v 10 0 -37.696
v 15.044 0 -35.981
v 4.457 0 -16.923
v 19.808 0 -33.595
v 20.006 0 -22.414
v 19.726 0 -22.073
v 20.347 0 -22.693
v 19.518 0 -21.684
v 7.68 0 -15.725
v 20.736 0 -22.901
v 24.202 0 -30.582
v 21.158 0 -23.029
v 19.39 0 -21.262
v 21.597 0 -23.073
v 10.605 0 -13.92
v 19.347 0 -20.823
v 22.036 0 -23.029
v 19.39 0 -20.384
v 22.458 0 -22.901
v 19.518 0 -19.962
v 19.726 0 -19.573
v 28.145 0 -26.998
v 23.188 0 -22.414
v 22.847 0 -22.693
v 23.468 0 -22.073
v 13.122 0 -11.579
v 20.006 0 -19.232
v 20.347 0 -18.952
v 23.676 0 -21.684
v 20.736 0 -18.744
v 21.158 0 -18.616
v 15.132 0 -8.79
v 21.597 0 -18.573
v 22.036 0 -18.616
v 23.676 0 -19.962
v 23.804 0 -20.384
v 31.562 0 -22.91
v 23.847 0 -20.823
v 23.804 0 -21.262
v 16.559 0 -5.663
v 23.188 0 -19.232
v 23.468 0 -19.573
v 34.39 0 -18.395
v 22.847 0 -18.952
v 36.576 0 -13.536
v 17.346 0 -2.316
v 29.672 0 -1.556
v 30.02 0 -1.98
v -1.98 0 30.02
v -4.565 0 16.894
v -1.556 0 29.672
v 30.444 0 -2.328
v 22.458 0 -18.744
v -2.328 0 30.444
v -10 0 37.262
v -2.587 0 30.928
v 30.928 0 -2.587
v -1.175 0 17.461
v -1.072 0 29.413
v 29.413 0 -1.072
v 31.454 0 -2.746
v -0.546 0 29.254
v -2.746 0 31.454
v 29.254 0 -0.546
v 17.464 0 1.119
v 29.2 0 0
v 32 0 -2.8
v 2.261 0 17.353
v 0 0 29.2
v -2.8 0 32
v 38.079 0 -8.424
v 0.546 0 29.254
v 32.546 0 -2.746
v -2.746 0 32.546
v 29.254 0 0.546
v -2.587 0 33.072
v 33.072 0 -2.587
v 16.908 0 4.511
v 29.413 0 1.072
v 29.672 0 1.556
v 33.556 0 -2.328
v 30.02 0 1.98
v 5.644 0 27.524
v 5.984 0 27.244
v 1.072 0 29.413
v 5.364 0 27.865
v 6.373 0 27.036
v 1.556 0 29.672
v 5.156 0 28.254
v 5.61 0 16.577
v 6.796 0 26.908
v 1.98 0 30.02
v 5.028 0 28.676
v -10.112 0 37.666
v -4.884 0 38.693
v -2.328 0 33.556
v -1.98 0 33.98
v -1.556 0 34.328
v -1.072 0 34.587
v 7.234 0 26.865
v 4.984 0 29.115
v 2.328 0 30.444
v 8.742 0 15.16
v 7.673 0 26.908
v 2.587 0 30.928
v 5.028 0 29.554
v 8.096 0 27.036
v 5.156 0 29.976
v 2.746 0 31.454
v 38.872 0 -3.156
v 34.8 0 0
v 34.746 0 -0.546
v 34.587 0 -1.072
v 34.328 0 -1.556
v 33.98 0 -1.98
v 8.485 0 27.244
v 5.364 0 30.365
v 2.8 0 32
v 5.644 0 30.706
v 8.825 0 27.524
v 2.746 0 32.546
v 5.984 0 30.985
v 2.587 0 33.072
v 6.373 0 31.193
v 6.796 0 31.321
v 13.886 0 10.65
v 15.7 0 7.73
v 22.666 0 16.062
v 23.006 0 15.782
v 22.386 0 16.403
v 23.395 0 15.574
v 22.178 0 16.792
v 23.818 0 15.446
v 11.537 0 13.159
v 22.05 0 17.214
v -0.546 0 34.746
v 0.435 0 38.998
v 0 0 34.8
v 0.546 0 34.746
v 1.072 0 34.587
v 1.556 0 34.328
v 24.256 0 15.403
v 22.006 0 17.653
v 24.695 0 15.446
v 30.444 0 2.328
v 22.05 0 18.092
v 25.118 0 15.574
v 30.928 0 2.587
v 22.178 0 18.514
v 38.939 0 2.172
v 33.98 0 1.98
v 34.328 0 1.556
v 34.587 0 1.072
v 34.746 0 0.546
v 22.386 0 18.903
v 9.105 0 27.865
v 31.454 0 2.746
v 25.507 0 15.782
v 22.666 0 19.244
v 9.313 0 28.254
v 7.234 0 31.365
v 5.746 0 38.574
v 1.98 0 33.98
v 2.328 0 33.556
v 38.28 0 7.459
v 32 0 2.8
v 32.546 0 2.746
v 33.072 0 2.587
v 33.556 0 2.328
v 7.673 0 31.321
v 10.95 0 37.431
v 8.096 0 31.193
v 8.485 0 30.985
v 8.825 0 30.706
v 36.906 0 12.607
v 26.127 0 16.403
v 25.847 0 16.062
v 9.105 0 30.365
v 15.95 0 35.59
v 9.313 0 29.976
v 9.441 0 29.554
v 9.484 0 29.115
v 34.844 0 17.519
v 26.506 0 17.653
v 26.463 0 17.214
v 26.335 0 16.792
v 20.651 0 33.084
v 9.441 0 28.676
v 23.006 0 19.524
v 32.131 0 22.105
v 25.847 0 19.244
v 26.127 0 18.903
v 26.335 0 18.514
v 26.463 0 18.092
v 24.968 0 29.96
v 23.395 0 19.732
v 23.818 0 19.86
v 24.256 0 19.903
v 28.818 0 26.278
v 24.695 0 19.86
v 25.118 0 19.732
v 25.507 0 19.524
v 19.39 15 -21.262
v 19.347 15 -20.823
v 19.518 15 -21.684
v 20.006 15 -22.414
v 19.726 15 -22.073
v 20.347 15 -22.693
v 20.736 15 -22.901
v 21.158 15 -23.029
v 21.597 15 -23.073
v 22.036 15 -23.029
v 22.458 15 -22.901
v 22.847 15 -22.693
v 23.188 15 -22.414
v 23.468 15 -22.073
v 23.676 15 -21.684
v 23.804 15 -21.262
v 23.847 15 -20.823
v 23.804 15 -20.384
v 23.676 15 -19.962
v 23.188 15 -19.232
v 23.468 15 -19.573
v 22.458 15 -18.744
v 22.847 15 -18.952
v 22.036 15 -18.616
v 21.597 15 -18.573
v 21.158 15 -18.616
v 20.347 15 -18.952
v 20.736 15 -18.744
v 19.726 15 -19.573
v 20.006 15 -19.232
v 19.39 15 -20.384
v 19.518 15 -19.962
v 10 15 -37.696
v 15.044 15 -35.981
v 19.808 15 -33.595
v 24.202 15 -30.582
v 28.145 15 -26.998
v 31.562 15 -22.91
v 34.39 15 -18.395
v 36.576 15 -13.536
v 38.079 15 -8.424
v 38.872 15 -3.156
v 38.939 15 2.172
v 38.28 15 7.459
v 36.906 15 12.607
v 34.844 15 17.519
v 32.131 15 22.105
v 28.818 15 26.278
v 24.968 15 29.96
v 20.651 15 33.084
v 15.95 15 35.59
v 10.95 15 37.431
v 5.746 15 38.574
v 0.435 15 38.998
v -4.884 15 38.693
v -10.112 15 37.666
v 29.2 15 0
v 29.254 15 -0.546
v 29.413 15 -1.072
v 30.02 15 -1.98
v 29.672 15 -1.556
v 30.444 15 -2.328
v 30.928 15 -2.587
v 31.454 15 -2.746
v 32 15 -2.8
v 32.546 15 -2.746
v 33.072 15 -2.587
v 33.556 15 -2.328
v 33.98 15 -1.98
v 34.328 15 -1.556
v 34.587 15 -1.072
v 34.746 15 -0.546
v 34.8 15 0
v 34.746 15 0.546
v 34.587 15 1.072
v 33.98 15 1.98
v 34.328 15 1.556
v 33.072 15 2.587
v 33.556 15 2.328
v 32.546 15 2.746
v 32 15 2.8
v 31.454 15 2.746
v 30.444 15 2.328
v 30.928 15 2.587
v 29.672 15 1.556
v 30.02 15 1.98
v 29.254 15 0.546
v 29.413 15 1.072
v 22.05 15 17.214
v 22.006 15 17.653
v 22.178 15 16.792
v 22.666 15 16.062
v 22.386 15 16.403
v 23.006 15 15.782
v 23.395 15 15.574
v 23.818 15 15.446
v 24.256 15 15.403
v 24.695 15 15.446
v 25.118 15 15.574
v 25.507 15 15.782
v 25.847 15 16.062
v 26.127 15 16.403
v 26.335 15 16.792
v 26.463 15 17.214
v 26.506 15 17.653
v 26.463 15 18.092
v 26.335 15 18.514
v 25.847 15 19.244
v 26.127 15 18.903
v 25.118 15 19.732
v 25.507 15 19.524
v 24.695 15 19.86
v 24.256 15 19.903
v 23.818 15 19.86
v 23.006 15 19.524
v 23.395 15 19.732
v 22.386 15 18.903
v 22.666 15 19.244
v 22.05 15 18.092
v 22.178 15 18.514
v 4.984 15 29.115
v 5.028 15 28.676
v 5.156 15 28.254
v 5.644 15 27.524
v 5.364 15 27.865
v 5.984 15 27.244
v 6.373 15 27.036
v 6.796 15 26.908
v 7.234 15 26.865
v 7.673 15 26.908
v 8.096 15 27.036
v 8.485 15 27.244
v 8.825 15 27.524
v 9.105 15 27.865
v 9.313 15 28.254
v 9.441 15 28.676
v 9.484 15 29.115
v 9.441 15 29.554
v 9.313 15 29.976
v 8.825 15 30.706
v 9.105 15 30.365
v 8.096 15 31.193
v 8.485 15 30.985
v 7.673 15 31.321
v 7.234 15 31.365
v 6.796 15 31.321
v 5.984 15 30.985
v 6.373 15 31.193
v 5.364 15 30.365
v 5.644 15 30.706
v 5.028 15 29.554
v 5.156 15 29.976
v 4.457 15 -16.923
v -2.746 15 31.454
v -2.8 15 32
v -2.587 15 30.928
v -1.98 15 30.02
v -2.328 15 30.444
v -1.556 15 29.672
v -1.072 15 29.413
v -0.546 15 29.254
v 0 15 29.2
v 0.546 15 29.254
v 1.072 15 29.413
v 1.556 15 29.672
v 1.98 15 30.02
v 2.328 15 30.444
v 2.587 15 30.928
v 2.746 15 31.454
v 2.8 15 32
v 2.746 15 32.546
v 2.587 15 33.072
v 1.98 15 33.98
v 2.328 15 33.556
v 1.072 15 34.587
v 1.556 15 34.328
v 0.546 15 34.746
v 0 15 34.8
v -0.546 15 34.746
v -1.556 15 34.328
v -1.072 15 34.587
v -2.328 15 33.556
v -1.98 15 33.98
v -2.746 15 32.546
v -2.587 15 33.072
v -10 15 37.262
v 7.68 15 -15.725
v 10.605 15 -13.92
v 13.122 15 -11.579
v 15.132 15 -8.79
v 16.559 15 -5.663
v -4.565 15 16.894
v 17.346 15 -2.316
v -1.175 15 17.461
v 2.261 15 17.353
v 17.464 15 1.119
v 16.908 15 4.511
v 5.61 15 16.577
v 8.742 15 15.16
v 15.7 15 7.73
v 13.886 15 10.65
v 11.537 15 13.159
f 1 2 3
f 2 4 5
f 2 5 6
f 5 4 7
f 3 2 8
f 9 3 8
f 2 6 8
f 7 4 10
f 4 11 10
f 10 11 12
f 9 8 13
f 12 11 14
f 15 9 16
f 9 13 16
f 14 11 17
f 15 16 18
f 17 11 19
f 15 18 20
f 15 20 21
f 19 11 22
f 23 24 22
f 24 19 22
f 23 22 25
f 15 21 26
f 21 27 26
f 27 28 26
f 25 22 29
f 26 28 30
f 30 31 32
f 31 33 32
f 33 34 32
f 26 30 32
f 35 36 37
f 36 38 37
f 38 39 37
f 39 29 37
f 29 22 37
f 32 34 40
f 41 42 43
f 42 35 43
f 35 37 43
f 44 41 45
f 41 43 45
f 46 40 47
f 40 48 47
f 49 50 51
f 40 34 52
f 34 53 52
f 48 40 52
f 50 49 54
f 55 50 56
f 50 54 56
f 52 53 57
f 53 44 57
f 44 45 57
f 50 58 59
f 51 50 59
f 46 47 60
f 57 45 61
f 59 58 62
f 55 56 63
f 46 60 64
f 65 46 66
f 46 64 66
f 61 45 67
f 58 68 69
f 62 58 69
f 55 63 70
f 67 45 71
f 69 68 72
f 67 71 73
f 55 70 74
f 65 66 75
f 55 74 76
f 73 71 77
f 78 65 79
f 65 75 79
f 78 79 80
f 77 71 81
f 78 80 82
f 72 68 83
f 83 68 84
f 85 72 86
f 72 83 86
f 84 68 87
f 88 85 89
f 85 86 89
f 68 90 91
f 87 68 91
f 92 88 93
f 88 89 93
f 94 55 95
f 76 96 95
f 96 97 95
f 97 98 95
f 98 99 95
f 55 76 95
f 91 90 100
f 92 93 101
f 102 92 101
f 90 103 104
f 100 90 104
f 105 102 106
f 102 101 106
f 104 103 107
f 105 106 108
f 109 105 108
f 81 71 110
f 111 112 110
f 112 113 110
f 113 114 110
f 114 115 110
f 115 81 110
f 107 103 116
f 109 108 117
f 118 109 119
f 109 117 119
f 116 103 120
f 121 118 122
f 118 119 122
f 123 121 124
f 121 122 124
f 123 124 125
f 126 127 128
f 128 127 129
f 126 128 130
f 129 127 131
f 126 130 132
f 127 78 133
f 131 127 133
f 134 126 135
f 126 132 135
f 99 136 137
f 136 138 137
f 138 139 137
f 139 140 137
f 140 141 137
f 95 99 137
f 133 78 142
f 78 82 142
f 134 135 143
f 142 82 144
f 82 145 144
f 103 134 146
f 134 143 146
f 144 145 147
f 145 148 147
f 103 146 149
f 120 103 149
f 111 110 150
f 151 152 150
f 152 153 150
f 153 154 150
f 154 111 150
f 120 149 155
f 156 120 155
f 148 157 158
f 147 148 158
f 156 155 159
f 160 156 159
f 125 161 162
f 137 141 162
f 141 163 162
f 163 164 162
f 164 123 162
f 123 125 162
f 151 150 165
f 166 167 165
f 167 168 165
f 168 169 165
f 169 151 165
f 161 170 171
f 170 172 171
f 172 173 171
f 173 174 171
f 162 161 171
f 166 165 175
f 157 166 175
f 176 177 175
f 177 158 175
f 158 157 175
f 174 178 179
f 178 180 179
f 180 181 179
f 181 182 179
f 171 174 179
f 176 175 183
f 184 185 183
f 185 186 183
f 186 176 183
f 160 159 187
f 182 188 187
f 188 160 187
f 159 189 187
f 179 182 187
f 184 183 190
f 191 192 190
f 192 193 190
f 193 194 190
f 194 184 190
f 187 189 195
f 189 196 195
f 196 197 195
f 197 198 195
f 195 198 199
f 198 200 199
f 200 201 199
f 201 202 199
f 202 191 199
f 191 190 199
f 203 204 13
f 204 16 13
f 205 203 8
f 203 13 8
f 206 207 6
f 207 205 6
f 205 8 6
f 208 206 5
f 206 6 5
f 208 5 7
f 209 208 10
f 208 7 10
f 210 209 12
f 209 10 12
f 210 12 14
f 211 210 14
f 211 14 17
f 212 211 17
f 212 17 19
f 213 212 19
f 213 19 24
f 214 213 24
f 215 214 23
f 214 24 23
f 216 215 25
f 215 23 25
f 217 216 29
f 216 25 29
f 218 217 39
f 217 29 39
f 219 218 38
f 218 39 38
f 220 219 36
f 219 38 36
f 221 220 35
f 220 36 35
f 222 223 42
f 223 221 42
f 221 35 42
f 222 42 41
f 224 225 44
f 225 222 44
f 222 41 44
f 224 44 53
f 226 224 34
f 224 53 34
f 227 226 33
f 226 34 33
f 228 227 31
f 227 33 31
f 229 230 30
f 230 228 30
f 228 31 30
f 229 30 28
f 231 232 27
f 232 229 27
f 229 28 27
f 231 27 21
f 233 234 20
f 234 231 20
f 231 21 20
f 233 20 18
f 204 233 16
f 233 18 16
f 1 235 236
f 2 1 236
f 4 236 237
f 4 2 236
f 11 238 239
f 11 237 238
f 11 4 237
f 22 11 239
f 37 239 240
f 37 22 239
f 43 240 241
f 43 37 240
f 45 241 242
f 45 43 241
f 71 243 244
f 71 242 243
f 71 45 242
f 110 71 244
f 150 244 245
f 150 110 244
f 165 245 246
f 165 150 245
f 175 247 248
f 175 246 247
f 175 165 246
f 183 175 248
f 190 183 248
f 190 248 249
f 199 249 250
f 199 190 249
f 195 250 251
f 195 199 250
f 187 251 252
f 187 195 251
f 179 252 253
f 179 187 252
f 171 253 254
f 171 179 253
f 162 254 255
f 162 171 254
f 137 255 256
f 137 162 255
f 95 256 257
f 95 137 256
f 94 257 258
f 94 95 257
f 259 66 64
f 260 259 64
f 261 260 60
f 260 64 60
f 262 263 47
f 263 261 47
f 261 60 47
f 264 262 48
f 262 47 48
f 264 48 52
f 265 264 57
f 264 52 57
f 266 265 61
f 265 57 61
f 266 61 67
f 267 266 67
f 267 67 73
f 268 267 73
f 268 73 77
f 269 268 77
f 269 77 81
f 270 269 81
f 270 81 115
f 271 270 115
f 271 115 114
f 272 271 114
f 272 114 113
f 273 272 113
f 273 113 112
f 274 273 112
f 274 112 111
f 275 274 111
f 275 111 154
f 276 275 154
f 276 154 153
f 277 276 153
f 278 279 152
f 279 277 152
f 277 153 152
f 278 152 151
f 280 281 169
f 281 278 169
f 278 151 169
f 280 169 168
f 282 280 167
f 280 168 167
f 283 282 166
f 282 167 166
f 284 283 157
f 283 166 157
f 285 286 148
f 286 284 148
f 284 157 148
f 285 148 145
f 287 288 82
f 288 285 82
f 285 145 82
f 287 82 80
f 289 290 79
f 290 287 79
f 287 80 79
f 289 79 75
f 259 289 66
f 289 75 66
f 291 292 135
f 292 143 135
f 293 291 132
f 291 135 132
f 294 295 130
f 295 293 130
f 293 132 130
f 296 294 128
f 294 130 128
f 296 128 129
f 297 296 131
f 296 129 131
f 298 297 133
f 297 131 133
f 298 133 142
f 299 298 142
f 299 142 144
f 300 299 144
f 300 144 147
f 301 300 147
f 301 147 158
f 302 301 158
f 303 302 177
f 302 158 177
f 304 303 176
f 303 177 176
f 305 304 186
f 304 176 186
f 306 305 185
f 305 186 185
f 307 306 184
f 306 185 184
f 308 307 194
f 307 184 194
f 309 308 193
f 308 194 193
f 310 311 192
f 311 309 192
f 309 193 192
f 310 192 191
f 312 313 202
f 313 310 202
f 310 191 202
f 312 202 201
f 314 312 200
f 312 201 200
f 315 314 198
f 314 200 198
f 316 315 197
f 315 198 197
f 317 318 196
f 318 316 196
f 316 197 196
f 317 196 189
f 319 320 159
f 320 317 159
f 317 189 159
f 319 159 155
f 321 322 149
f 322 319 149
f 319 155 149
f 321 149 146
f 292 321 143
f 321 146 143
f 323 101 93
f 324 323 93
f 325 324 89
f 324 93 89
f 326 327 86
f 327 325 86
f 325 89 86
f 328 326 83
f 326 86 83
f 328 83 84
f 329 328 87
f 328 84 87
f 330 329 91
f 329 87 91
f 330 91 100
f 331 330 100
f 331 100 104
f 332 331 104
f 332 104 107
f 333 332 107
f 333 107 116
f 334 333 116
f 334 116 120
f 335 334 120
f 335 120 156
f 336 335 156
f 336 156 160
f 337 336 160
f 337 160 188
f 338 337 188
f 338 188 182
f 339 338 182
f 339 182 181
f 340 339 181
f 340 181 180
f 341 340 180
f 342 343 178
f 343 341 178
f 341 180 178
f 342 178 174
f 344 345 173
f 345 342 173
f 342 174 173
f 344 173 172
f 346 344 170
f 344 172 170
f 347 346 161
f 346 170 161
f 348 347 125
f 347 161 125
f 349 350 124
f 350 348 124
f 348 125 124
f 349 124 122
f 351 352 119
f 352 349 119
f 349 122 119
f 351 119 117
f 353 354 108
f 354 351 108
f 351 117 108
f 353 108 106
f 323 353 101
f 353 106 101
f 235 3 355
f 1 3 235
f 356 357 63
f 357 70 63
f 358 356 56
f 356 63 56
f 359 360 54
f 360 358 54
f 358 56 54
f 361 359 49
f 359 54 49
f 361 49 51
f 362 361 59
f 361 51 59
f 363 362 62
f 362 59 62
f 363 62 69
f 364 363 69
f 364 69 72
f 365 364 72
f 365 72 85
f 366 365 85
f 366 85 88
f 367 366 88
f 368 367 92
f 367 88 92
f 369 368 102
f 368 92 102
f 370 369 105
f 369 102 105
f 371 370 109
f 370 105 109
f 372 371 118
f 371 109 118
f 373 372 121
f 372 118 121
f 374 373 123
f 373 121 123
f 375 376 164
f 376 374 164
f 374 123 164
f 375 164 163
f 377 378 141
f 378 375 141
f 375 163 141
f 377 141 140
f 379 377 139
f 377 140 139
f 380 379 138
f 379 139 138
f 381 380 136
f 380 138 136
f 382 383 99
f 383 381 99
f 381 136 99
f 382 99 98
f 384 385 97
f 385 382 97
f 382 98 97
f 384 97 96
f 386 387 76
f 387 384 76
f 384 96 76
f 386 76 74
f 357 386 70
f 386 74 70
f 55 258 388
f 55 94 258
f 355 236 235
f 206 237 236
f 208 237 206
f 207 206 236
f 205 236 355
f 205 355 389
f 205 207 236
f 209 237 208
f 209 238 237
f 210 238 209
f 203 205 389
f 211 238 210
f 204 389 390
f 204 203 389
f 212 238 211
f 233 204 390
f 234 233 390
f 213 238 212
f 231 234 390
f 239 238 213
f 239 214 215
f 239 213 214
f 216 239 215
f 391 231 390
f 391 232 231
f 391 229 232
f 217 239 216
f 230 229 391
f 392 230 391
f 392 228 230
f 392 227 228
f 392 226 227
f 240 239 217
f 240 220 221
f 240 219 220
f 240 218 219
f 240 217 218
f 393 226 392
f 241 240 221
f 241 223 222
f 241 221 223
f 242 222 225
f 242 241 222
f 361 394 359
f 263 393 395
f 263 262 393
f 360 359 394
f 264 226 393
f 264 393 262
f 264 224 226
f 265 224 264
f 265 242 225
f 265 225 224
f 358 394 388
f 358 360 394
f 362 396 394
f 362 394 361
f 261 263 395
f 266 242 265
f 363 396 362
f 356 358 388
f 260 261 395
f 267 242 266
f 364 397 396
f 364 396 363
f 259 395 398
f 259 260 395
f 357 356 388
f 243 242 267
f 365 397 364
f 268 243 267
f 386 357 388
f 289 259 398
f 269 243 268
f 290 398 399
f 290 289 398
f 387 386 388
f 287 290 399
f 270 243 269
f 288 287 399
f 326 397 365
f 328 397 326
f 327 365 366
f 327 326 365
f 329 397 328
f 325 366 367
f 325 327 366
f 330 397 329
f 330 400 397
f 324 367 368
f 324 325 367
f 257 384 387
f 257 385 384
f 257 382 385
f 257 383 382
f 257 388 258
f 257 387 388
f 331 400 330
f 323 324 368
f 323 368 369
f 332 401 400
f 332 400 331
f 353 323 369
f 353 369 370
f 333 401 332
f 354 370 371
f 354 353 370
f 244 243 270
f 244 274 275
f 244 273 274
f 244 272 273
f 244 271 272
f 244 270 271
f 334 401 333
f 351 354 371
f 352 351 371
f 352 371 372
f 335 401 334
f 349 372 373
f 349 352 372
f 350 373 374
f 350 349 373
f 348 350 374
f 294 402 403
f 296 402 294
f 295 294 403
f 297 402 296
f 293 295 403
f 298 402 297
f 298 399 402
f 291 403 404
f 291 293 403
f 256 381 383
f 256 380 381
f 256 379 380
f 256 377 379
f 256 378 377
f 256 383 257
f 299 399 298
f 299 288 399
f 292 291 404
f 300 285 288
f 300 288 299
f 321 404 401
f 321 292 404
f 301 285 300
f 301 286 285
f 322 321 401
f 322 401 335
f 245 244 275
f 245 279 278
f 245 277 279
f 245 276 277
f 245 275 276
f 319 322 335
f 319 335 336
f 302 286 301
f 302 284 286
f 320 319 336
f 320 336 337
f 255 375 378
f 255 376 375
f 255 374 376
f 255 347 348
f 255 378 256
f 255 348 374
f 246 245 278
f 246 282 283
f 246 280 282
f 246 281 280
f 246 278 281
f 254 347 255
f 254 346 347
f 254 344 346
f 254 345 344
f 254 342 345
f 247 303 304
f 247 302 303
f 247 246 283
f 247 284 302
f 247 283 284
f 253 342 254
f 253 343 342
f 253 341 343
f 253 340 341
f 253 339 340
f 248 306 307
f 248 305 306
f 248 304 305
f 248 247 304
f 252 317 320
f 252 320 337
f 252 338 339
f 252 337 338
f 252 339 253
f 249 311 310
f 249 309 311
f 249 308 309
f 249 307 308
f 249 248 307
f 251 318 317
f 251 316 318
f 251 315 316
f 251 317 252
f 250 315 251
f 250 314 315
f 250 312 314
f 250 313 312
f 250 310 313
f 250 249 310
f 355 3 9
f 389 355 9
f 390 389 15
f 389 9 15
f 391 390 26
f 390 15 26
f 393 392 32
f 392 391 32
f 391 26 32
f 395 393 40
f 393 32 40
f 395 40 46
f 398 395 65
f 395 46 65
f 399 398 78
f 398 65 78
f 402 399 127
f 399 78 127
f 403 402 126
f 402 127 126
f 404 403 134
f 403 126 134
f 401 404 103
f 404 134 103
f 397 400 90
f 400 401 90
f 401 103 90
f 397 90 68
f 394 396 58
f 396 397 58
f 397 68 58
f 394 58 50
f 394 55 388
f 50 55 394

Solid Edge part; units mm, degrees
sketch "Sketch1" plane through (0, 0, 0) normal (0, 1, 0) x (-1, 0, 0)
  circle A0 centre (16.756, -24.8845) radius 2.25
  circle A1 centre (27.4161, 12.1803) radius 2.25
  circle A2 centre (-7.2345, 29.1146) radius 2.25
  circle A3 centre (-21.5968, -20.8226) radius 2.25
  circle A4 centre (0, -32) radius 2.8
  circle A5 centre (0, 32) radius 2.8
  circle A6 centre (0, 0) radius 39
  circle A7 centre (-32, 0) radius 2.8
  circle A8 centre (32, 0) radius 2.8
  circle A9 centre (-24.2565, 17.6529) radius 2.25
  circle A10 centre (13.1726, 26.9533) radius 2.25
  circle A11 centre (28.8313, -8.2921) radius 2.25
  circle A12 centre (0, 0) radius 17.5
extrude "Protrusion1" add sketch "Sketch1" along normal blind 15
sketch "Sketch2" plane through (0, 15, 0) normal (0, 1, 0) x (-1, 0, 0)
  circle A0 centre (27.4161, 12.1803) radius 2.25
  circle A1 centre (32, 0) radius 2.8
  circle A2 centre (13.1726, 26.9533) radius 2.25
  circle A3 centre (16.756, -24.8845) radius 2.25
  circle A4 centre (28.8313, -8.2921) radius 2.25
  circle A5 centre (0, -32) radius 2.8
  arc A6 (4.5655, 16.894) -> (-4.4574, -16.9228) centre (0, 0) cw
  line L0 (-4.4574, -16.9228) -> (-10, -37.6962)
  arc A7 (10.1123, 37.6662) -> (-10, -37.6962) centre (0, 0) cw
  line L1 (10.1123, 37.6662) -> (10, 37.262)
  line L2 (10, 37.262) -> (4.5655, 16.894)
extrude "ExtrudedCutout_1" cut sketch "Sketch2" along normal mid plane 476
